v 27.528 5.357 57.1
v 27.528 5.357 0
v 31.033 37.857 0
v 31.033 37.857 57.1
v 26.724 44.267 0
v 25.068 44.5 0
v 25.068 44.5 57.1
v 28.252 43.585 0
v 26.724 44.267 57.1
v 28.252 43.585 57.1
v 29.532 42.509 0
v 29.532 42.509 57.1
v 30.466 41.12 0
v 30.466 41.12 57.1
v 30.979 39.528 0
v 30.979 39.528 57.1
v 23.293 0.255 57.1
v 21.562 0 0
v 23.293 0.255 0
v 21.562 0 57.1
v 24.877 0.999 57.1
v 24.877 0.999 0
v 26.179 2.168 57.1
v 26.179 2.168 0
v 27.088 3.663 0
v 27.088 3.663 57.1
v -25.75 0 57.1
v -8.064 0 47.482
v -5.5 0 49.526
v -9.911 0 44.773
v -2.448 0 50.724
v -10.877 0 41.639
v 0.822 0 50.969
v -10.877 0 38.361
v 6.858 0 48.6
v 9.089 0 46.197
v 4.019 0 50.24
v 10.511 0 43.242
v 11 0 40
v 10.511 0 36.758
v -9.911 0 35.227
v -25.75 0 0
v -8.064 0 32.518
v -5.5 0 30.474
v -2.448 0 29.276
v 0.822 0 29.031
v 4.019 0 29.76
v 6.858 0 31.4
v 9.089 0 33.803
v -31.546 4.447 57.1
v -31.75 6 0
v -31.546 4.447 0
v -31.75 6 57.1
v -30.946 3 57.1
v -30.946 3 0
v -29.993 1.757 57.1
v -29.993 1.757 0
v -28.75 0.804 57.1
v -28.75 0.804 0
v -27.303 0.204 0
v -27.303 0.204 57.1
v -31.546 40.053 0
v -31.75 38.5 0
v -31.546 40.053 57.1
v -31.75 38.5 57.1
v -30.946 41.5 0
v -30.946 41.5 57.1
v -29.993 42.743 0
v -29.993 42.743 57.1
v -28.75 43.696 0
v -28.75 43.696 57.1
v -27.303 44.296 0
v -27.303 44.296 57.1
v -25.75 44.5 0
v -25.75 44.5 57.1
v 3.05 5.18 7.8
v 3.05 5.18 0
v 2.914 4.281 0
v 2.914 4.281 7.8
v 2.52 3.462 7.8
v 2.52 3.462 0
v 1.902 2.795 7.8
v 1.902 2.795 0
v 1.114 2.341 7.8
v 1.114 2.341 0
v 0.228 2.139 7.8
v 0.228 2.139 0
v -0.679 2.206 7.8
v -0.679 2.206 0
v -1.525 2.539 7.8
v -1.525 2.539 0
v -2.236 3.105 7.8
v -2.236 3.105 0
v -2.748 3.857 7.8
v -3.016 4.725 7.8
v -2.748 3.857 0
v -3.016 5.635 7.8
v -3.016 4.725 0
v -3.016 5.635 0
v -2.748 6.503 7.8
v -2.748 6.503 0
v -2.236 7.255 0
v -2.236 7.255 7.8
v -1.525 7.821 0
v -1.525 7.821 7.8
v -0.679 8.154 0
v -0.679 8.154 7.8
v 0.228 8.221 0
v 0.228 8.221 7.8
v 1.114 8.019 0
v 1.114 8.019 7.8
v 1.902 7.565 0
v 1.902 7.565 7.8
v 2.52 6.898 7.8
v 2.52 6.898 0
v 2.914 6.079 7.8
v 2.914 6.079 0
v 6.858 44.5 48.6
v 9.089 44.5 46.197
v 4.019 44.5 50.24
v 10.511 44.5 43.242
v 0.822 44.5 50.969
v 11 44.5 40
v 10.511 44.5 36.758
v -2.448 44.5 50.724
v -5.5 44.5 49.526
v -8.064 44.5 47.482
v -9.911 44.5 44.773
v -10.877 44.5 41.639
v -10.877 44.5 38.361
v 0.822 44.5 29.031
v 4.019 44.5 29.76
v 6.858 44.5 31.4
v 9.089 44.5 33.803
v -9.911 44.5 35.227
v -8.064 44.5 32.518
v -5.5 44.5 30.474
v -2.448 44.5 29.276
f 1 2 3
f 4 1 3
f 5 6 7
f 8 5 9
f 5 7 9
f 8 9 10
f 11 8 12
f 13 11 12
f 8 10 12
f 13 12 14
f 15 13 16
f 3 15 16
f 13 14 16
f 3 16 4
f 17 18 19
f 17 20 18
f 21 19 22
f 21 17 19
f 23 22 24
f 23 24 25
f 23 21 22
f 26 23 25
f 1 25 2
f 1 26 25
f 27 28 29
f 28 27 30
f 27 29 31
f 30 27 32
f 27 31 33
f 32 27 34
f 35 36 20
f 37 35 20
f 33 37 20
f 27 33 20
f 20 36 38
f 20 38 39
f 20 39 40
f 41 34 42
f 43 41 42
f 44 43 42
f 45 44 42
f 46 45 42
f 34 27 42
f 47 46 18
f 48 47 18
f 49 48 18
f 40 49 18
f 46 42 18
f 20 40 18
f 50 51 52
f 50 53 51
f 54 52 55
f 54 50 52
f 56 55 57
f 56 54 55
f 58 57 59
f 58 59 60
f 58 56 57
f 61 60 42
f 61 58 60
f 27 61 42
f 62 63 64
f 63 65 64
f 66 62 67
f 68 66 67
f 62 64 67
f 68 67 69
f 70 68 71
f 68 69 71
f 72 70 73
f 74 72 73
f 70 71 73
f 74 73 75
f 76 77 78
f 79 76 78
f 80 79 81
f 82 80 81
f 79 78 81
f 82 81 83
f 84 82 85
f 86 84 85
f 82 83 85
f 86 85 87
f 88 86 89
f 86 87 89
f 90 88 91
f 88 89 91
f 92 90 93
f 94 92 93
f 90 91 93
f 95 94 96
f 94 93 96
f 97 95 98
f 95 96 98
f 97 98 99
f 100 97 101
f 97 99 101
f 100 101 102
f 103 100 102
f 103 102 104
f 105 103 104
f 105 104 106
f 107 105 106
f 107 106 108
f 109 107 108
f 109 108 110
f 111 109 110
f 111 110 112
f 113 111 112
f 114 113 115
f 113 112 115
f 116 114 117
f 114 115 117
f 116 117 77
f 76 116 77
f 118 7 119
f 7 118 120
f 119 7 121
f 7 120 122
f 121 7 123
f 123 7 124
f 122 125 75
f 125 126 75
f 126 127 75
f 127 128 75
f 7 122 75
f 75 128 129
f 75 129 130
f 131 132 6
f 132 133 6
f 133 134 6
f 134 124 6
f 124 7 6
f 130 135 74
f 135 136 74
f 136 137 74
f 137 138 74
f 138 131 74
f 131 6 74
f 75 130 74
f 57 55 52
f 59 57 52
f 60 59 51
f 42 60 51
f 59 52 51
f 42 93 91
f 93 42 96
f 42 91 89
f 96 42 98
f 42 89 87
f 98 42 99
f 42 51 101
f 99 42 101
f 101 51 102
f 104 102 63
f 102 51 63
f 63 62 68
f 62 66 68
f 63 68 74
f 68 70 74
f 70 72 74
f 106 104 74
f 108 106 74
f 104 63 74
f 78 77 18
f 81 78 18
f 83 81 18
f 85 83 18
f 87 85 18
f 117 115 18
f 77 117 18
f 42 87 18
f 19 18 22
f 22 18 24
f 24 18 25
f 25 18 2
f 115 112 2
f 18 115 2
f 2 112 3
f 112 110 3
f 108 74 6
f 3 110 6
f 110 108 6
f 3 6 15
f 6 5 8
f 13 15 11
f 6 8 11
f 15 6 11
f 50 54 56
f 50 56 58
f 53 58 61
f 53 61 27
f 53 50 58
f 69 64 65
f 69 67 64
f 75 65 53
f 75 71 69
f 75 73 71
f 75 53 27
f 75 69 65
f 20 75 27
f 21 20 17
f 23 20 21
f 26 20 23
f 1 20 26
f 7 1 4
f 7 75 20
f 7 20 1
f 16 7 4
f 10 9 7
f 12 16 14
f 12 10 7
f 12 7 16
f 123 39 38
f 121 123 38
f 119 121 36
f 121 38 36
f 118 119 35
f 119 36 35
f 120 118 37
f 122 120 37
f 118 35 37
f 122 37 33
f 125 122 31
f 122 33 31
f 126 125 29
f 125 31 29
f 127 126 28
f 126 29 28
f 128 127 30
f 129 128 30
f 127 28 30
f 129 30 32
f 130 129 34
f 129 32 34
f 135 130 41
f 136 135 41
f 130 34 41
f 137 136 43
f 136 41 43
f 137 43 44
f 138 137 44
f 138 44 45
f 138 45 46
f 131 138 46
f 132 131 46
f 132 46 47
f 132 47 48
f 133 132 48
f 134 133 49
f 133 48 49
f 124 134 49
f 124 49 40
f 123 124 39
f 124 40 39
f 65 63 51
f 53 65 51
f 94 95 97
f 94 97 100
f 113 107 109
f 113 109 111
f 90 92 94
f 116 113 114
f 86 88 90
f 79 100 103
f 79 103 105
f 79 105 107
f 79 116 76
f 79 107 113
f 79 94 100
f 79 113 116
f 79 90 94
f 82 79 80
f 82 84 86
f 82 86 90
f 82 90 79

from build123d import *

# Parameters (mm, degrees)
F1_DEPTH = 57.1
F2_R     = 11
F3_DEPTH = 44.5
F4_R     = 3.05
F5_DEPTH = 7.8
F6_R     = 6


with BuildPart() as f1:
    # F0 (on Top) → F1 (new body)
    with BuildSketch(Plane.XY):
        Polygon((-31.75, 44.5), (-31.75, 0), (26.95, 0), (31.75, 44.5), align=None)
    extrude(amount=F1_DEPTH)

    # F2 (on face) → F3 (cut, through all)
    with BuildSketch(Plane.XZ):
        with Locations((0, 40)):
            Circle(F2_R)
    extrude(amount=-F3_DEPTH, mode=Mode.SUBTRACT)

    # F4 (on face) → F5 (cut)
    with BuildSketch(Plane(origin=(0, 0, 0), x_dir=(1, 0, 0), z_dir=(0, 0, -1))):
        with Locations((0, -5.18)):
            Circle(F4_R)
    extrude(amount=-F5_DEPTH, mode=Mode.SUBTRACT)

    # F6
    f6_edges = [f1.edges().sort_by_distance(p)[0] for p in [
        (-31.75, 0, 28.55),
        (-31.75, 44.5, 28.55),
        (26.95, 0, 28.55),
        (31.75, 44.5, 28.55),
    ]]
    fillet(f6_edges, radius=F6_R)


solid = f1.part
